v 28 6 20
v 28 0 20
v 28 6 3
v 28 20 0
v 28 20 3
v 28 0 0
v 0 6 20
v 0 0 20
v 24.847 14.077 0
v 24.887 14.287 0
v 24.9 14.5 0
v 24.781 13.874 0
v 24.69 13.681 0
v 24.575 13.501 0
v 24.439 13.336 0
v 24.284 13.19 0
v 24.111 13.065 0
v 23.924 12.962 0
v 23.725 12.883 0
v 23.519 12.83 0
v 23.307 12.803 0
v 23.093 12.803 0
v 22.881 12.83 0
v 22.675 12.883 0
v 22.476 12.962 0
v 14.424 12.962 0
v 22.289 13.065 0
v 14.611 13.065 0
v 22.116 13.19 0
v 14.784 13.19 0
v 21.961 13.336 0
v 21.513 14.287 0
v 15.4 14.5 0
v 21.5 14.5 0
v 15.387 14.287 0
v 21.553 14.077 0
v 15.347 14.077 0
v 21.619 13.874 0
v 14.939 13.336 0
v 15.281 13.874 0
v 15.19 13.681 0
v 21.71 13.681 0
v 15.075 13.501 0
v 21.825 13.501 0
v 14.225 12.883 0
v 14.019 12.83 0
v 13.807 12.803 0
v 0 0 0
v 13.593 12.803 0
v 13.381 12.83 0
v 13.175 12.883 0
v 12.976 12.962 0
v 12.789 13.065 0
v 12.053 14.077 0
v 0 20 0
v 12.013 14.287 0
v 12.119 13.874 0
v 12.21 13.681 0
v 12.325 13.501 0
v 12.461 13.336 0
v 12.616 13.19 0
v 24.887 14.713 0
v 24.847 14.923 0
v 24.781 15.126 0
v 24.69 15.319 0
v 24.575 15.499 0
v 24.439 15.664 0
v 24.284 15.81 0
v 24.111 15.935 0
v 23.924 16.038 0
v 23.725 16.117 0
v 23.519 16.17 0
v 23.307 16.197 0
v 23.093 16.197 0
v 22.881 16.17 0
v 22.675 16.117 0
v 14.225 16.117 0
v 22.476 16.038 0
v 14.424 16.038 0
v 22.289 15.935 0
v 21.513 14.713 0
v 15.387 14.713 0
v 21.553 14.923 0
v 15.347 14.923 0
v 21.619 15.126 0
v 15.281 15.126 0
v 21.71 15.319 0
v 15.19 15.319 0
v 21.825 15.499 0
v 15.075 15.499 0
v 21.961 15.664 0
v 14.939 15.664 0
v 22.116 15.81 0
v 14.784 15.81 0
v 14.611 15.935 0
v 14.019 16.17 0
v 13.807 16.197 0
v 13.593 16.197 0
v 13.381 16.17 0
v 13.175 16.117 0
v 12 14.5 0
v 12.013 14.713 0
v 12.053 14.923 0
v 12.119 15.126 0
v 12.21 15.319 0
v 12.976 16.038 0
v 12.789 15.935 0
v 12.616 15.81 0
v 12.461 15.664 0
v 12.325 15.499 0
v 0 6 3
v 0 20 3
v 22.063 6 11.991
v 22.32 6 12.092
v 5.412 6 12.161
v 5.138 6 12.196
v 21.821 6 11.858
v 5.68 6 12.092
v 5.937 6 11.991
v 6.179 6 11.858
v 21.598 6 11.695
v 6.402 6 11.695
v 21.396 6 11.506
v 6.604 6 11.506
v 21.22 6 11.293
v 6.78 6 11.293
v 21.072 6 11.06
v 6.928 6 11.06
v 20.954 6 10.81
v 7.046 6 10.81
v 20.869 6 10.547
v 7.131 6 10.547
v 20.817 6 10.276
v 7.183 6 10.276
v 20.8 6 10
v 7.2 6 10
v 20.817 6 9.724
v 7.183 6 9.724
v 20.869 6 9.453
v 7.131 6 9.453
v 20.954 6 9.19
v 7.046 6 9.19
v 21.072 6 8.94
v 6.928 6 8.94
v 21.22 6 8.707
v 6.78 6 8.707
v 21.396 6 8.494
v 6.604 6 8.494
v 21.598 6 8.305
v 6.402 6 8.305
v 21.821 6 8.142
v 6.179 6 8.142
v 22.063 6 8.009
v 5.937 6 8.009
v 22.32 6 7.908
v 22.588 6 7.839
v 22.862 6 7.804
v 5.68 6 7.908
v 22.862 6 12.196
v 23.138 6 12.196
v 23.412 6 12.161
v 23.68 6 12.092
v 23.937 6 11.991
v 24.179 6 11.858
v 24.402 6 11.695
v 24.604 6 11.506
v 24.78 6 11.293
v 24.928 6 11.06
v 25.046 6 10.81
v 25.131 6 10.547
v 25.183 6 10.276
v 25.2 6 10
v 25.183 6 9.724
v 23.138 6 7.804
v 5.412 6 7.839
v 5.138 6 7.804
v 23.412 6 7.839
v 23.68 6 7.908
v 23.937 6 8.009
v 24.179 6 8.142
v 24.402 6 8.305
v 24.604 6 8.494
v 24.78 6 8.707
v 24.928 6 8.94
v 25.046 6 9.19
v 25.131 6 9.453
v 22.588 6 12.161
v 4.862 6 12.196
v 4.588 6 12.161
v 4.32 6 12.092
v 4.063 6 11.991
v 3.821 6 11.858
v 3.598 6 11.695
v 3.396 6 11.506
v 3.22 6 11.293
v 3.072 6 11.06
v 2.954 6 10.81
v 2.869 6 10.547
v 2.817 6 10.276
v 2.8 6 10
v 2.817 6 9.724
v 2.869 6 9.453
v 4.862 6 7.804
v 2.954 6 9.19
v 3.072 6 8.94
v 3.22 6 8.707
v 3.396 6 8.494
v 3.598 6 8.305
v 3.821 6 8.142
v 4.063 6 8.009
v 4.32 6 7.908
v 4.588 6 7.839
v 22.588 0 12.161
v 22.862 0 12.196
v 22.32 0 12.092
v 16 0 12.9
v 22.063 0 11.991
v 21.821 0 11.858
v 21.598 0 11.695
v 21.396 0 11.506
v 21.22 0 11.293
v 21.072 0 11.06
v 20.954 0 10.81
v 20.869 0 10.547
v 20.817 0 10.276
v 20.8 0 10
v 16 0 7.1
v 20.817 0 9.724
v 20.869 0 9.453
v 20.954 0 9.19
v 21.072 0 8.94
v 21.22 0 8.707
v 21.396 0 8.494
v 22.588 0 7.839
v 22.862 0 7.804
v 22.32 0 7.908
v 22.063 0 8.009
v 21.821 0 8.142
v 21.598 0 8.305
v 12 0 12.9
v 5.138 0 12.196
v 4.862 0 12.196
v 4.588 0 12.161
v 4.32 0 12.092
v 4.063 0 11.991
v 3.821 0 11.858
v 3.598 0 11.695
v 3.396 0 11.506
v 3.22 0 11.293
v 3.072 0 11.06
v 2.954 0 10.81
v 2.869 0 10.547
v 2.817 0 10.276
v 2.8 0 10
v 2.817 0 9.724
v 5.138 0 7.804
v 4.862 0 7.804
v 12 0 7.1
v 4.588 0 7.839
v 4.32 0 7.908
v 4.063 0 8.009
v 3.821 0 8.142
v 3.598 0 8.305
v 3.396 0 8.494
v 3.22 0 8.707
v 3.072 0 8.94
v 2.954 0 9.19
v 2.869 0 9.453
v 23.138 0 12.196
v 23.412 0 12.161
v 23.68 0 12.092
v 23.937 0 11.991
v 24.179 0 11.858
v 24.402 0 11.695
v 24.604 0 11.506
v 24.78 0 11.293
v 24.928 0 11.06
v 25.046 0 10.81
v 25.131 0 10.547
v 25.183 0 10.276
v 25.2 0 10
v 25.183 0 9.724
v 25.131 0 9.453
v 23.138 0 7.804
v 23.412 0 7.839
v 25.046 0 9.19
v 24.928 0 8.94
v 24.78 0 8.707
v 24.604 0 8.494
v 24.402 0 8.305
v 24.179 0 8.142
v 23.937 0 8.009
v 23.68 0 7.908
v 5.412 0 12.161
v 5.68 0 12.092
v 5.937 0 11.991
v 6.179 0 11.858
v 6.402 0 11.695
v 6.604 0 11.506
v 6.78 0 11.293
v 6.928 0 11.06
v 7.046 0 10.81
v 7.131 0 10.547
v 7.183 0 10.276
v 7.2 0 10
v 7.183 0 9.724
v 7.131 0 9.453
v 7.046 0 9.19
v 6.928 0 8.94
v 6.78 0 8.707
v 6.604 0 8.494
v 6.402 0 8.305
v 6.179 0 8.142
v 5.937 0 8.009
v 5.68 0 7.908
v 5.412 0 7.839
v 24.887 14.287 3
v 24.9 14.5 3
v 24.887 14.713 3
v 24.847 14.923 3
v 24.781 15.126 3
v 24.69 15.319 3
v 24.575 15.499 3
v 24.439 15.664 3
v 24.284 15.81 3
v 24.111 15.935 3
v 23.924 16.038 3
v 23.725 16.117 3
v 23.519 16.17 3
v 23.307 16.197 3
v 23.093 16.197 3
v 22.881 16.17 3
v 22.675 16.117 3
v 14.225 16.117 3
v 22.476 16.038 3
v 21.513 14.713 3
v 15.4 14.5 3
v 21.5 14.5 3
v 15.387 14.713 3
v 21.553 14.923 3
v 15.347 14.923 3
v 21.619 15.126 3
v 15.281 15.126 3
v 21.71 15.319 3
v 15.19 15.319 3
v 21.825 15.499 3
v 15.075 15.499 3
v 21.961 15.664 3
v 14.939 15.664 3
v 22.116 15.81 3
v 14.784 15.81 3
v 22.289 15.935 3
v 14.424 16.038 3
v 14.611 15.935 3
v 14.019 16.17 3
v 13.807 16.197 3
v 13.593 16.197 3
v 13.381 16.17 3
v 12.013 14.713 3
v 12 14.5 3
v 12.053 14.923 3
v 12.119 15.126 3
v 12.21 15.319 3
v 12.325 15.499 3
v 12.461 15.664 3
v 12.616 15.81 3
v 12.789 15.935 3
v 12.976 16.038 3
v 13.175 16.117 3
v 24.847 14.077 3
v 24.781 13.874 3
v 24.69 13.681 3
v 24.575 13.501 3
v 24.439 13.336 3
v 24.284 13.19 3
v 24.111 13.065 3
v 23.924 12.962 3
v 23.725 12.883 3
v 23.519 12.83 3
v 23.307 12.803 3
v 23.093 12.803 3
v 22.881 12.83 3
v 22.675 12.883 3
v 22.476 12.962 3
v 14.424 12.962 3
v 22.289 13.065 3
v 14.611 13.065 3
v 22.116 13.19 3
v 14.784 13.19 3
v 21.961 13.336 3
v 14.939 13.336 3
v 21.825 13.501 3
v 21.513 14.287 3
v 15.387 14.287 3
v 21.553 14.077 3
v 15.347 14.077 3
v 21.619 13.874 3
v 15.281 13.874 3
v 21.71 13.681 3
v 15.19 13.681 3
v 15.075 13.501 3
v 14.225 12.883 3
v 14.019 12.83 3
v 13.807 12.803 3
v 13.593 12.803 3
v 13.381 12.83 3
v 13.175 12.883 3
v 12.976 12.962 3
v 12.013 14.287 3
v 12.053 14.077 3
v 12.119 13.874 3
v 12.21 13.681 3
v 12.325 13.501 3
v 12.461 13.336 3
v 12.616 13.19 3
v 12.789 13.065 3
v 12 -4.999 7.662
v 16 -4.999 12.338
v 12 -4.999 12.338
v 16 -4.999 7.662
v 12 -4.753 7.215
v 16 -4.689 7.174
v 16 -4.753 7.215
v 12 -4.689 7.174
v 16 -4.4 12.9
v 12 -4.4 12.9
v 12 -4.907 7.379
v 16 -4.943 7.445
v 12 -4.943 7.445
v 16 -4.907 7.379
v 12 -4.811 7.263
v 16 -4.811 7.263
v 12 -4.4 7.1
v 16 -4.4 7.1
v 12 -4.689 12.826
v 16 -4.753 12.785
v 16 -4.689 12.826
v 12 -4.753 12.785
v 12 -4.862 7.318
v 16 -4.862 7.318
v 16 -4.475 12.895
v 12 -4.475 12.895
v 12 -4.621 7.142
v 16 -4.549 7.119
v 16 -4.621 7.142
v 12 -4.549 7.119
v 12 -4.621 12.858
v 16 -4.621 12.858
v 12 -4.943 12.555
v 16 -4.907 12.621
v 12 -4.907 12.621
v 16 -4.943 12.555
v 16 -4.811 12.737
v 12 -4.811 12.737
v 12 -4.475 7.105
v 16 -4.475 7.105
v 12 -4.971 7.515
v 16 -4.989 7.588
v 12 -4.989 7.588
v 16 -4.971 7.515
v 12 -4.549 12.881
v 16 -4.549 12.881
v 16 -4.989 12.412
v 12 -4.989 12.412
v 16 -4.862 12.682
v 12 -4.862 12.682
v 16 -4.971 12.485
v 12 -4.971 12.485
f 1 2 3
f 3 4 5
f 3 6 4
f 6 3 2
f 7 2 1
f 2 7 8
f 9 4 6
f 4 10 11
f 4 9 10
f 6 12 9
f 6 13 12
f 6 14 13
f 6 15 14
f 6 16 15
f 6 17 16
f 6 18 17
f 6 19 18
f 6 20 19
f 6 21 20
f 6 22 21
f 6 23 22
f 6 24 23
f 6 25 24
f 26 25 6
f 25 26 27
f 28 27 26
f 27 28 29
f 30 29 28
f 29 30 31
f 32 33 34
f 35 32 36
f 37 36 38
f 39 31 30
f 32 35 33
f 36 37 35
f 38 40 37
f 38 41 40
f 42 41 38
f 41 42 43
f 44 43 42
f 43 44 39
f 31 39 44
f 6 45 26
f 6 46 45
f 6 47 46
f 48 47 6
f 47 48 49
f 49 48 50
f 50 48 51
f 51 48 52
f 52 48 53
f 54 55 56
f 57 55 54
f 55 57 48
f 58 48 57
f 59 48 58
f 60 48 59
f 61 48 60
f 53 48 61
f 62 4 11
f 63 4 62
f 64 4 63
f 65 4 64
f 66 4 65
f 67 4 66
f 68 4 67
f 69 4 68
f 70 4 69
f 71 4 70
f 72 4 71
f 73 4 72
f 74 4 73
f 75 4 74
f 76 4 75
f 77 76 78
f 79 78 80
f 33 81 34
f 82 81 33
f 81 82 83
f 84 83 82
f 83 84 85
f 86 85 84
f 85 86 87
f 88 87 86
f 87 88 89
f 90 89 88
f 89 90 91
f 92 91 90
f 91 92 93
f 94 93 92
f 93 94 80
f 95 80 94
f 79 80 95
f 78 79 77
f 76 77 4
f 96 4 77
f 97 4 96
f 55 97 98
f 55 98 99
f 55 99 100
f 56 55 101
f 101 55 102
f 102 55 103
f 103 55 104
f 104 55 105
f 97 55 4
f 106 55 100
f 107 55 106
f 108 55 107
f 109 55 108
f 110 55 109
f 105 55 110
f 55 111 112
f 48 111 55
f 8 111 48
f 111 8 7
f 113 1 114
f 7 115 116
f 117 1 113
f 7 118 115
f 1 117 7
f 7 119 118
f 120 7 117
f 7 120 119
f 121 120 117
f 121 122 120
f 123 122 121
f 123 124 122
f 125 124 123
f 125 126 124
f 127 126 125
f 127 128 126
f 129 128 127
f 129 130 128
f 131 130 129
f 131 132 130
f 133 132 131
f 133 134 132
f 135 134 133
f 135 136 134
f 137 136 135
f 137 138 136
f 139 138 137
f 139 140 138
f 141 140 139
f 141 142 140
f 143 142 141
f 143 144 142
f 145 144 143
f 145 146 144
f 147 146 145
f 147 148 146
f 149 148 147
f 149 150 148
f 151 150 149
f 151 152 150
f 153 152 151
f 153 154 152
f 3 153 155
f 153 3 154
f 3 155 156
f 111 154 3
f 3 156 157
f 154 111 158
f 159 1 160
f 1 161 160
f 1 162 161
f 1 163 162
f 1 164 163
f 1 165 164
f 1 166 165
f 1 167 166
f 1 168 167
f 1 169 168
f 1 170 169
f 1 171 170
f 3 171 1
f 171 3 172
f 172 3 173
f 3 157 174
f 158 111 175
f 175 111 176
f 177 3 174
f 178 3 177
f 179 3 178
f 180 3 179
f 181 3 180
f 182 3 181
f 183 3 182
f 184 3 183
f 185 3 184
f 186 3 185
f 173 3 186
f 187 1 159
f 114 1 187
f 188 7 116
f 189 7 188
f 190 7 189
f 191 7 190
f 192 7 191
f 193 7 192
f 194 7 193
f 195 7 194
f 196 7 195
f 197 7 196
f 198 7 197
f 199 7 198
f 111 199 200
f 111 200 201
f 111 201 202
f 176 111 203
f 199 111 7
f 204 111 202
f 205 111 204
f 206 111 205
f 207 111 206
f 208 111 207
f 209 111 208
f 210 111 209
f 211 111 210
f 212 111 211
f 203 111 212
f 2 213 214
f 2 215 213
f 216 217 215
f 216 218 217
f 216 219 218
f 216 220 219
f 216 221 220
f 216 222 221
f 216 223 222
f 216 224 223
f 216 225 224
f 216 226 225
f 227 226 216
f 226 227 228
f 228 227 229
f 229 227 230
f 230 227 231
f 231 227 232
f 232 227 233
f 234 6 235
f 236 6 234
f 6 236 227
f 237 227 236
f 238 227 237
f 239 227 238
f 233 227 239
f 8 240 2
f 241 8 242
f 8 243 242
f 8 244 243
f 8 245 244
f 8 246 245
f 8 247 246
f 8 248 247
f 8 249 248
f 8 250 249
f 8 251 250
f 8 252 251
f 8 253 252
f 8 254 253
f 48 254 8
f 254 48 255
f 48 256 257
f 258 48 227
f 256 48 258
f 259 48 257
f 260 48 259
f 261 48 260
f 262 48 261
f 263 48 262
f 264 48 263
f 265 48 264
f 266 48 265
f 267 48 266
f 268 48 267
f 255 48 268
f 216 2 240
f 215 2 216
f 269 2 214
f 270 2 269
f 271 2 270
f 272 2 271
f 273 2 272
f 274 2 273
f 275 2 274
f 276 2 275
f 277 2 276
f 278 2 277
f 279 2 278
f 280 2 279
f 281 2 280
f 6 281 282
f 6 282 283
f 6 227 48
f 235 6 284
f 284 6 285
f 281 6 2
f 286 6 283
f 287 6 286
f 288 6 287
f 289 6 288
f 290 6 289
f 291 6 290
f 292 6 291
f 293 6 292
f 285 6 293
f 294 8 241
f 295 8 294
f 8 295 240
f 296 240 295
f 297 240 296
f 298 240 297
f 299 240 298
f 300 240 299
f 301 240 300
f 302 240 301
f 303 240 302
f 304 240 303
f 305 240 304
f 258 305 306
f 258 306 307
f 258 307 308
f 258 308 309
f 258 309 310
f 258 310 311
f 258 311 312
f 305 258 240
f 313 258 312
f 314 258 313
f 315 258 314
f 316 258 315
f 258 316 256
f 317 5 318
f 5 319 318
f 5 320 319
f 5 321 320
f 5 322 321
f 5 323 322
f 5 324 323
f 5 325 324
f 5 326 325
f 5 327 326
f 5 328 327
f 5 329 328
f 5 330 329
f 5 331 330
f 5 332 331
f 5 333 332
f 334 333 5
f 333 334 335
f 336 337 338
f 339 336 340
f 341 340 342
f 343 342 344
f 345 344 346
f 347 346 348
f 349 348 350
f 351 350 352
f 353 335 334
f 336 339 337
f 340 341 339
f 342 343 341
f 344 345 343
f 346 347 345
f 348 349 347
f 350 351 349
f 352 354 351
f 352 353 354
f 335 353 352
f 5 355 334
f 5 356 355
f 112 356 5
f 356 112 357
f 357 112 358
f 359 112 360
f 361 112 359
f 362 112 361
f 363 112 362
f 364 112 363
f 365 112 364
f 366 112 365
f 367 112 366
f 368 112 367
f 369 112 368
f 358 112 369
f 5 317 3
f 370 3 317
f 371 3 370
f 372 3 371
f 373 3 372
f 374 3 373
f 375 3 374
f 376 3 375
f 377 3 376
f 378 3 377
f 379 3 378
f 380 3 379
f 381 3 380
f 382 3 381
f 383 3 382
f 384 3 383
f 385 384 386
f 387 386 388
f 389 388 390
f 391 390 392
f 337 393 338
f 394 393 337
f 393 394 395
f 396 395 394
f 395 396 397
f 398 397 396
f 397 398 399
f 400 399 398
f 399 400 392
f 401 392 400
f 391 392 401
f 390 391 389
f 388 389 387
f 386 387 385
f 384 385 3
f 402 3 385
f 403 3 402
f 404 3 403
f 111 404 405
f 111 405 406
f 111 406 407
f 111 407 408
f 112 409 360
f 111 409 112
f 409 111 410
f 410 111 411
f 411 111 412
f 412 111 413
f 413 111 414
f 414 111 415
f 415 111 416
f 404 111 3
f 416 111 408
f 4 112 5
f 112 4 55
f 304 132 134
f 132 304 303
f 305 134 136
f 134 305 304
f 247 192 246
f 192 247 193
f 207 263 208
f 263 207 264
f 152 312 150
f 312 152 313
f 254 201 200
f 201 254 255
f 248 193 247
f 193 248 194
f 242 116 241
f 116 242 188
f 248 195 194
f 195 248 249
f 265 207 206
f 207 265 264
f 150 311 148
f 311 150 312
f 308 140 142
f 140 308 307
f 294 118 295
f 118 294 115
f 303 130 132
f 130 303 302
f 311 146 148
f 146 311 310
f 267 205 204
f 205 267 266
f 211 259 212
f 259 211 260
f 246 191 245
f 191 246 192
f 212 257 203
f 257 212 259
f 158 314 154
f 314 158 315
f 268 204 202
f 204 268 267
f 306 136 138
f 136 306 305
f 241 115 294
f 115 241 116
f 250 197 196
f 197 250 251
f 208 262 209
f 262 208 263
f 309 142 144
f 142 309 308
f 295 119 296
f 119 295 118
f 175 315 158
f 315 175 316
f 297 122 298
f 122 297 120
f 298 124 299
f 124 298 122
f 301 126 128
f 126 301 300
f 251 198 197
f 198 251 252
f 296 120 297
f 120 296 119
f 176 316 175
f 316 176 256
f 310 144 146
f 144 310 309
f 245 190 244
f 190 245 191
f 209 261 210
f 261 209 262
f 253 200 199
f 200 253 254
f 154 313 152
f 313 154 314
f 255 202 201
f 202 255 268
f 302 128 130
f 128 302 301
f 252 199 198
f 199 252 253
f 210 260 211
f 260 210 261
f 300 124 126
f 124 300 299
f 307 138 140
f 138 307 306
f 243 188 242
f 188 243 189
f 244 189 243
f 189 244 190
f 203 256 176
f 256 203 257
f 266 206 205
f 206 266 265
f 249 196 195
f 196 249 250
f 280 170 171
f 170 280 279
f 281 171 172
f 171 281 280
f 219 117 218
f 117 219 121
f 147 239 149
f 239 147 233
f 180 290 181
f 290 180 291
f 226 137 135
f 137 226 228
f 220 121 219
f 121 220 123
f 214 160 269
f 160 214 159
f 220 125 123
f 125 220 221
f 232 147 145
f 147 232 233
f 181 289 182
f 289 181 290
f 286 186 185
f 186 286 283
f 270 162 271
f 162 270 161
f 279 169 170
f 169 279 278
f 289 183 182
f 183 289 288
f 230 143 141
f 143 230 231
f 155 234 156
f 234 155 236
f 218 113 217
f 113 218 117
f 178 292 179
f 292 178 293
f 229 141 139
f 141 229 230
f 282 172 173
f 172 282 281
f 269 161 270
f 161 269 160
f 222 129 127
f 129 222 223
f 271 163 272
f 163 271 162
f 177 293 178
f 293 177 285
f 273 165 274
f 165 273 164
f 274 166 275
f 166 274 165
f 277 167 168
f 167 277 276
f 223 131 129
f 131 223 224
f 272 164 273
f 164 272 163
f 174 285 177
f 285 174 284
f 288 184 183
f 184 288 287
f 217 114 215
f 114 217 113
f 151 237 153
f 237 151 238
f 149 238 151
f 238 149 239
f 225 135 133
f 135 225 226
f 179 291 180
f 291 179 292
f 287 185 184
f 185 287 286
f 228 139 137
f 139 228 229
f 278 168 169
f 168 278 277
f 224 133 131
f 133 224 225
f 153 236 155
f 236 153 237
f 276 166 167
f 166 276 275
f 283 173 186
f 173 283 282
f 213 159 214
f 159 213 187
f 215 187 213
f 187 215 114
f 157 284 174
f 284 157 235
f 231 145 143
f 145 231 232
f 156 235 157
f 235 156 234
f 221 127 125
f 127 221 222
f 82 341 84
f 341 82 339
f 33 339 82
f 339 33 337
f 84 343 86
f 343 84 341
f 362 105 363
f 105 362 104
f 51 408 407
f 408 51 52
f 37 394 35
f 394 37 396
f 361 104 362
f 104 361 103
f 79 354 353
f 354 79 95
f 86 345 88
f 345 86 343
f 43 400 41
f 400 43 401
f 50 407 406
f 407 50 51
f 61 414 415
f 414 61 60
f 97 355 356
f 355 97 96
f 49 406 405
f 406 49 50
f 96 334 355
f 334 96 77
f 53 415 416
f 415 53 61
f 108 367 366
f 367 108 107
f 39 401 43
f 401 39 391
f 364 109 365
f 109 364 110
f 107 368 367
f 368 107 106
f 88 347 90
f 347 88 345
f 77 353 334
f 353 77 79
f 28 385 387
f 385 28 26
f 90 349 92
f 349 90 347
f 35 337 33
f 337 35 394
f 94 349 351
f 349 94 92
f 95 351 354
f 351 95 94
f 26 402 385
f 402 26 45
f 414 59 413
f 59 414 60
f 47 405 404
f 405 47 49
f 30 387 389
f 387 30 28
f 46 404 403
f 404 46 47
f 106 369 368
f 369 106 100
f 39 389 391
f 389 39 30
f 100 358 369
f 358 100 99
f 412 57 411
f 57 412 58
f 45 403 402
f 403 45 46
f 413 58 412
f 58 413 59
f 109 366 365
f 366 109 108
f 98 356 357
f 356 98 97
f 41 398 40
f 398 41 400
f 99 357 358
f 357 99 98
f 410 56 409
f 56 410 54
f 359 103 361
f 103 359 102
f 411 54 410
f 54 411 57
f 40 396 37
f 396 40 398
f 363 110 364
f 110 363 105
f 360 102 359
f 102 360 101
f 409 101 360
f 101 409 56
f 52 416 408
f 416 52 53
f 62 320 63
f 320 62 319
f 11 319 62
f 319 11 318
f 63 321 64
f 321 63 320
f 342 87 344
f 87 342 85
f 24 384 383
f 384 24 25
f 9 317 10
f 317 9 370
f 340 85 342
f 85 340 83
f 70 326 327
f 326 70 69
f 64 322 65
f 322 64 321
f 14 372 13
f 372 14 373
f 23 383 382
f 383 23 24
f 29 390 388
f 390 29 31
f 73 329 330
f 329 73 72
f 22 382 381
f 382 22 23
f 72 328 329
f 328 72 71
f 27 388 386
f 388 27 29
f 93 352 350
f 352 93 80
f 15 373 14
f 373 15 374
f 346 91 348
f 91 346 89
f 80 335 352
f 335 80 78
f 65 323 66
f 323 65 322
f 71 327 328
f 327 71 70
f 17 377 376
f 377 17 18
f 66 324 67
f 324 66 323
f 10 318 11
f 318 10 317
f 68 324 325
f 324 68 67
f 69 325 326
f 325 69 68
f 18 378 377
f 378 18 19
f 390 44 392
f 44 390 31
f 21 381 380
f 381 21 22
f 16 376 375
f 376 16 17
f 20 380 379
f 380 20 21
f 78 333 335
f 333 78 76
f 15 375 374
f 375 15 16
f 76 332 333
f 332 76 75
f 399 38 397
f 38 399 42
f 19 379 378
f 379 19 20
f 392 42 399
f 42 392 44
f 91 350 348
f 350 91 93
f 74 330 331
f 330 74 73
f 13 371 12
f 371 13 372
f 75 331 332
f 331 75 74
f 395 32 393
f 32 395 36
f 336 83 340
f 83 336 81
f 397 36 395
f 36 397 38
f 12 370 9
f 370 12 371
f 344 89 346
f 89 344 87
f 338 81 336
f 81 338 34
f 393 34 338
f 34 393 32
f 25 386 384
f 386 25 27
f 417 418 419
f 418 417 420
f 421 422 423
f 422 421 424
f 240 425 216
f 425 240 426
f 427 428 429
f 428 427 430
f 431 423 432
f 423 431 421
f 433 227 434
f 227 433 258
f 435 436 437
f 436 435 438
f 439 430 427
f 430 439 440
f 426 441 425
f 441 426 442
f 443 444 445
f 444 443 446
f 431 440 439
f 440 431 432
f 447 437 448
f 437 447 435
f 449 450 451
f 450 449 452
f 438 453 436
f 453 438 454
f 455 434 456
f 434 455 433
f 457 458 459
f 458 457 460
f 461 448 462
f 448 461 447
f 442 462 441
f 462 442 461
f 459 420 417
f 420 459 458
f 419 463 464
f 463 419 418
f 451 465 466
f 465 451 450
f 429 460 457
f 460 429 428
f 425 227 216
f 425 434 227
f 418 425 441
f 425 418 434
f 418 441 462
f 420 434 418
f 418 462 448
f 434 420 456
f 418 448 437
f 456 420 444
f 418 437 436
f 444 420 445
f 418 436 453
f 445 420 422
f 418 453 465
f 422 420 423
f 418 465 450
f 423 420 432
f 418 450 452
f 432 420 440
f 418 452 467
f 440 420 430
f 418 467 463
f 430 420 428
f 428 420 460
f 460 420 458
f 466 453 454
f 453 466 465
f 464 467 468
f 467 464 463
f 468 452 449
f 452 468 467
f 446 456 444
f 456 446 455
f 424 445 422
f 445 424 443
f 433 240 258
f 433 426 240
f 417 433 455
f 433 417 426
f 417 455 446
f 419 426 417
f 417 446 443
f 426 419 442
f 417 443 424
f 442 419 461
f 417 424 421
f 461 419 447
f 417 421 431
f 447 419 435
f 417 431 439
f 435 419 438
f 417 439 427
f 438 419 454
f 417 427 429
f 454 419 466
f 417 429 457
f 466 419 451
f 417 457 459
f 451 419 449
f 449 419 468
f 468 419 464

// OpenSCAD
// file: ../lib/nutsnbolts/data-access.scad
// Norm Nuts and Bolts - a OpenSCAD library
// Copyright (C) 2012  Johannes Kneer

// This program is free software: you can redistribute it and/or modify
// it under the terms of the GNU General Public License as published by
// the Free Software Foundation, either version 3 of the License, or
// (at your option) any later version.

// This program is distributed in the hope that it will be useful,
// but WITHOUT ANY WARRANTY; without even the implied warranty of
// MERCHANTABILITY or FITNESS FOR A PARTICULAR PURPOSE.  See the
// GNU General Public License for more details.

// You should have received a copy of the GNU General Public License
// along with this program.  If not, see <http://www.gnu.org/licenses/>.


// DATABASE ACCESS FUNCTIONS AND CONSTANTS



// == CONSTANTS == 

// screw table access keys
_NB_S_DESC            = 0;
_NB_S_FAMKEY			 = 1;
_NB_S_LENGTH          = 2;
_NB_S_NOTHREAD_LENGTH = 3;

_NB_F_DESC			 = 0;
_NB_F_OUTER_DIA       = 1;
_NB_F_INNER_DIA       = 2;
_NB_F_LEAD            = 3; 
_NB_F_KEY             = 4;
_NB_F_KEY_DEPTH       = 5;
_NB_F_HEAD_HEIGHT     = 6;
_NB_F_HEAD_DIA        = 7;
_NB_F_NUT_KEY         = 8;
_NB_F_NUT_HEIGHT      = 9;


// == FUNCTIONS ==

// _get_screw("descriptor")   with descriptor = M8x25
//   find the line for a general object in the data matrix

function _get_screw(n) = data_screw[search([n], data_screw)[0]];
function _get_screw_fam(n) = data_screw_fam[search([_get_screw(n)[_NB_S_FAMKEY]], data_screw_fam)[0]];

function _get_fam(n) = data_screw_fam[search([n], data_screw_fam)[0]];


// _get_XXXXX("descriptor") functions
// find a single property in the database

function _get_desc(n)        = _get_screw(n)[_NB_S_DESC];
function _get_famkey(n)         = _get_screw(n)[_NB_S_FAMKEY];
function _get_length(n)      = _get_screw(n)[_NB_S_LENGTH];
function _get_nt_length(n)   = _get_screw(n)[_NB_S_NOTHREAD_LENGTH];

function _get_outer_dia(n)   = _get_screw_fam(n)[_NB_F_OUTER_DIA];
function _get_inner_dia(n)   = _get_screw_fam(n)[_NB_F_INNER_DIA];
function _get_lead(n)        = _get_screw_fam(n)[_NB_F_LEAD];
function _get_head_height(n) = _get_screw_fam(n)[_NB_F_HEAD_HEIGHT];
function _get_head_dia(n)    = _get_screw_fam(n)[_NB_F_HEAD_DIA];
function _get_nut_key(n)     = _get_screw_fam(n)[_NB_F_NUT_KEY];
function _get_nut_height(n)  = _get_screw_fam(n)[_NB_F_NUT_HEIGHT];
// file: ../globals.scad
// Global variables

$fn = 50;
clearance = 0.4; // Nozzle width
// main file
include <../globals.scad>
include <../lib/nutsnbolts/cyl_head_bolt.scad>;

module x_end_stop()
{
    difference(){
        union(){
            cube([28,6,20]);
            cube([28,20,3]);
        }
        translate([5,0,10])rotate([90,0,0])hole_through("M4",l=8, cld=clearance);
        translate([23,0,10])rotate([90,0,0])hole_through("M4",l=8, cld=clearance);
        translate([13.7,14.5,10])hole_through("M3",l=12, cld=clearance);
        translate([13.7+9.5,14.5,10])hole_through("M3",l=12, cld=clearance);
    }
    
    translate([16,-5,7.1])rotate([0,-90,0])translate([0.6,0.6,0])minkowski(){
        cube([4.6,4.4,3]);
        cylinder(d=1.2,h=1);
    }
}

x_end_stop();
